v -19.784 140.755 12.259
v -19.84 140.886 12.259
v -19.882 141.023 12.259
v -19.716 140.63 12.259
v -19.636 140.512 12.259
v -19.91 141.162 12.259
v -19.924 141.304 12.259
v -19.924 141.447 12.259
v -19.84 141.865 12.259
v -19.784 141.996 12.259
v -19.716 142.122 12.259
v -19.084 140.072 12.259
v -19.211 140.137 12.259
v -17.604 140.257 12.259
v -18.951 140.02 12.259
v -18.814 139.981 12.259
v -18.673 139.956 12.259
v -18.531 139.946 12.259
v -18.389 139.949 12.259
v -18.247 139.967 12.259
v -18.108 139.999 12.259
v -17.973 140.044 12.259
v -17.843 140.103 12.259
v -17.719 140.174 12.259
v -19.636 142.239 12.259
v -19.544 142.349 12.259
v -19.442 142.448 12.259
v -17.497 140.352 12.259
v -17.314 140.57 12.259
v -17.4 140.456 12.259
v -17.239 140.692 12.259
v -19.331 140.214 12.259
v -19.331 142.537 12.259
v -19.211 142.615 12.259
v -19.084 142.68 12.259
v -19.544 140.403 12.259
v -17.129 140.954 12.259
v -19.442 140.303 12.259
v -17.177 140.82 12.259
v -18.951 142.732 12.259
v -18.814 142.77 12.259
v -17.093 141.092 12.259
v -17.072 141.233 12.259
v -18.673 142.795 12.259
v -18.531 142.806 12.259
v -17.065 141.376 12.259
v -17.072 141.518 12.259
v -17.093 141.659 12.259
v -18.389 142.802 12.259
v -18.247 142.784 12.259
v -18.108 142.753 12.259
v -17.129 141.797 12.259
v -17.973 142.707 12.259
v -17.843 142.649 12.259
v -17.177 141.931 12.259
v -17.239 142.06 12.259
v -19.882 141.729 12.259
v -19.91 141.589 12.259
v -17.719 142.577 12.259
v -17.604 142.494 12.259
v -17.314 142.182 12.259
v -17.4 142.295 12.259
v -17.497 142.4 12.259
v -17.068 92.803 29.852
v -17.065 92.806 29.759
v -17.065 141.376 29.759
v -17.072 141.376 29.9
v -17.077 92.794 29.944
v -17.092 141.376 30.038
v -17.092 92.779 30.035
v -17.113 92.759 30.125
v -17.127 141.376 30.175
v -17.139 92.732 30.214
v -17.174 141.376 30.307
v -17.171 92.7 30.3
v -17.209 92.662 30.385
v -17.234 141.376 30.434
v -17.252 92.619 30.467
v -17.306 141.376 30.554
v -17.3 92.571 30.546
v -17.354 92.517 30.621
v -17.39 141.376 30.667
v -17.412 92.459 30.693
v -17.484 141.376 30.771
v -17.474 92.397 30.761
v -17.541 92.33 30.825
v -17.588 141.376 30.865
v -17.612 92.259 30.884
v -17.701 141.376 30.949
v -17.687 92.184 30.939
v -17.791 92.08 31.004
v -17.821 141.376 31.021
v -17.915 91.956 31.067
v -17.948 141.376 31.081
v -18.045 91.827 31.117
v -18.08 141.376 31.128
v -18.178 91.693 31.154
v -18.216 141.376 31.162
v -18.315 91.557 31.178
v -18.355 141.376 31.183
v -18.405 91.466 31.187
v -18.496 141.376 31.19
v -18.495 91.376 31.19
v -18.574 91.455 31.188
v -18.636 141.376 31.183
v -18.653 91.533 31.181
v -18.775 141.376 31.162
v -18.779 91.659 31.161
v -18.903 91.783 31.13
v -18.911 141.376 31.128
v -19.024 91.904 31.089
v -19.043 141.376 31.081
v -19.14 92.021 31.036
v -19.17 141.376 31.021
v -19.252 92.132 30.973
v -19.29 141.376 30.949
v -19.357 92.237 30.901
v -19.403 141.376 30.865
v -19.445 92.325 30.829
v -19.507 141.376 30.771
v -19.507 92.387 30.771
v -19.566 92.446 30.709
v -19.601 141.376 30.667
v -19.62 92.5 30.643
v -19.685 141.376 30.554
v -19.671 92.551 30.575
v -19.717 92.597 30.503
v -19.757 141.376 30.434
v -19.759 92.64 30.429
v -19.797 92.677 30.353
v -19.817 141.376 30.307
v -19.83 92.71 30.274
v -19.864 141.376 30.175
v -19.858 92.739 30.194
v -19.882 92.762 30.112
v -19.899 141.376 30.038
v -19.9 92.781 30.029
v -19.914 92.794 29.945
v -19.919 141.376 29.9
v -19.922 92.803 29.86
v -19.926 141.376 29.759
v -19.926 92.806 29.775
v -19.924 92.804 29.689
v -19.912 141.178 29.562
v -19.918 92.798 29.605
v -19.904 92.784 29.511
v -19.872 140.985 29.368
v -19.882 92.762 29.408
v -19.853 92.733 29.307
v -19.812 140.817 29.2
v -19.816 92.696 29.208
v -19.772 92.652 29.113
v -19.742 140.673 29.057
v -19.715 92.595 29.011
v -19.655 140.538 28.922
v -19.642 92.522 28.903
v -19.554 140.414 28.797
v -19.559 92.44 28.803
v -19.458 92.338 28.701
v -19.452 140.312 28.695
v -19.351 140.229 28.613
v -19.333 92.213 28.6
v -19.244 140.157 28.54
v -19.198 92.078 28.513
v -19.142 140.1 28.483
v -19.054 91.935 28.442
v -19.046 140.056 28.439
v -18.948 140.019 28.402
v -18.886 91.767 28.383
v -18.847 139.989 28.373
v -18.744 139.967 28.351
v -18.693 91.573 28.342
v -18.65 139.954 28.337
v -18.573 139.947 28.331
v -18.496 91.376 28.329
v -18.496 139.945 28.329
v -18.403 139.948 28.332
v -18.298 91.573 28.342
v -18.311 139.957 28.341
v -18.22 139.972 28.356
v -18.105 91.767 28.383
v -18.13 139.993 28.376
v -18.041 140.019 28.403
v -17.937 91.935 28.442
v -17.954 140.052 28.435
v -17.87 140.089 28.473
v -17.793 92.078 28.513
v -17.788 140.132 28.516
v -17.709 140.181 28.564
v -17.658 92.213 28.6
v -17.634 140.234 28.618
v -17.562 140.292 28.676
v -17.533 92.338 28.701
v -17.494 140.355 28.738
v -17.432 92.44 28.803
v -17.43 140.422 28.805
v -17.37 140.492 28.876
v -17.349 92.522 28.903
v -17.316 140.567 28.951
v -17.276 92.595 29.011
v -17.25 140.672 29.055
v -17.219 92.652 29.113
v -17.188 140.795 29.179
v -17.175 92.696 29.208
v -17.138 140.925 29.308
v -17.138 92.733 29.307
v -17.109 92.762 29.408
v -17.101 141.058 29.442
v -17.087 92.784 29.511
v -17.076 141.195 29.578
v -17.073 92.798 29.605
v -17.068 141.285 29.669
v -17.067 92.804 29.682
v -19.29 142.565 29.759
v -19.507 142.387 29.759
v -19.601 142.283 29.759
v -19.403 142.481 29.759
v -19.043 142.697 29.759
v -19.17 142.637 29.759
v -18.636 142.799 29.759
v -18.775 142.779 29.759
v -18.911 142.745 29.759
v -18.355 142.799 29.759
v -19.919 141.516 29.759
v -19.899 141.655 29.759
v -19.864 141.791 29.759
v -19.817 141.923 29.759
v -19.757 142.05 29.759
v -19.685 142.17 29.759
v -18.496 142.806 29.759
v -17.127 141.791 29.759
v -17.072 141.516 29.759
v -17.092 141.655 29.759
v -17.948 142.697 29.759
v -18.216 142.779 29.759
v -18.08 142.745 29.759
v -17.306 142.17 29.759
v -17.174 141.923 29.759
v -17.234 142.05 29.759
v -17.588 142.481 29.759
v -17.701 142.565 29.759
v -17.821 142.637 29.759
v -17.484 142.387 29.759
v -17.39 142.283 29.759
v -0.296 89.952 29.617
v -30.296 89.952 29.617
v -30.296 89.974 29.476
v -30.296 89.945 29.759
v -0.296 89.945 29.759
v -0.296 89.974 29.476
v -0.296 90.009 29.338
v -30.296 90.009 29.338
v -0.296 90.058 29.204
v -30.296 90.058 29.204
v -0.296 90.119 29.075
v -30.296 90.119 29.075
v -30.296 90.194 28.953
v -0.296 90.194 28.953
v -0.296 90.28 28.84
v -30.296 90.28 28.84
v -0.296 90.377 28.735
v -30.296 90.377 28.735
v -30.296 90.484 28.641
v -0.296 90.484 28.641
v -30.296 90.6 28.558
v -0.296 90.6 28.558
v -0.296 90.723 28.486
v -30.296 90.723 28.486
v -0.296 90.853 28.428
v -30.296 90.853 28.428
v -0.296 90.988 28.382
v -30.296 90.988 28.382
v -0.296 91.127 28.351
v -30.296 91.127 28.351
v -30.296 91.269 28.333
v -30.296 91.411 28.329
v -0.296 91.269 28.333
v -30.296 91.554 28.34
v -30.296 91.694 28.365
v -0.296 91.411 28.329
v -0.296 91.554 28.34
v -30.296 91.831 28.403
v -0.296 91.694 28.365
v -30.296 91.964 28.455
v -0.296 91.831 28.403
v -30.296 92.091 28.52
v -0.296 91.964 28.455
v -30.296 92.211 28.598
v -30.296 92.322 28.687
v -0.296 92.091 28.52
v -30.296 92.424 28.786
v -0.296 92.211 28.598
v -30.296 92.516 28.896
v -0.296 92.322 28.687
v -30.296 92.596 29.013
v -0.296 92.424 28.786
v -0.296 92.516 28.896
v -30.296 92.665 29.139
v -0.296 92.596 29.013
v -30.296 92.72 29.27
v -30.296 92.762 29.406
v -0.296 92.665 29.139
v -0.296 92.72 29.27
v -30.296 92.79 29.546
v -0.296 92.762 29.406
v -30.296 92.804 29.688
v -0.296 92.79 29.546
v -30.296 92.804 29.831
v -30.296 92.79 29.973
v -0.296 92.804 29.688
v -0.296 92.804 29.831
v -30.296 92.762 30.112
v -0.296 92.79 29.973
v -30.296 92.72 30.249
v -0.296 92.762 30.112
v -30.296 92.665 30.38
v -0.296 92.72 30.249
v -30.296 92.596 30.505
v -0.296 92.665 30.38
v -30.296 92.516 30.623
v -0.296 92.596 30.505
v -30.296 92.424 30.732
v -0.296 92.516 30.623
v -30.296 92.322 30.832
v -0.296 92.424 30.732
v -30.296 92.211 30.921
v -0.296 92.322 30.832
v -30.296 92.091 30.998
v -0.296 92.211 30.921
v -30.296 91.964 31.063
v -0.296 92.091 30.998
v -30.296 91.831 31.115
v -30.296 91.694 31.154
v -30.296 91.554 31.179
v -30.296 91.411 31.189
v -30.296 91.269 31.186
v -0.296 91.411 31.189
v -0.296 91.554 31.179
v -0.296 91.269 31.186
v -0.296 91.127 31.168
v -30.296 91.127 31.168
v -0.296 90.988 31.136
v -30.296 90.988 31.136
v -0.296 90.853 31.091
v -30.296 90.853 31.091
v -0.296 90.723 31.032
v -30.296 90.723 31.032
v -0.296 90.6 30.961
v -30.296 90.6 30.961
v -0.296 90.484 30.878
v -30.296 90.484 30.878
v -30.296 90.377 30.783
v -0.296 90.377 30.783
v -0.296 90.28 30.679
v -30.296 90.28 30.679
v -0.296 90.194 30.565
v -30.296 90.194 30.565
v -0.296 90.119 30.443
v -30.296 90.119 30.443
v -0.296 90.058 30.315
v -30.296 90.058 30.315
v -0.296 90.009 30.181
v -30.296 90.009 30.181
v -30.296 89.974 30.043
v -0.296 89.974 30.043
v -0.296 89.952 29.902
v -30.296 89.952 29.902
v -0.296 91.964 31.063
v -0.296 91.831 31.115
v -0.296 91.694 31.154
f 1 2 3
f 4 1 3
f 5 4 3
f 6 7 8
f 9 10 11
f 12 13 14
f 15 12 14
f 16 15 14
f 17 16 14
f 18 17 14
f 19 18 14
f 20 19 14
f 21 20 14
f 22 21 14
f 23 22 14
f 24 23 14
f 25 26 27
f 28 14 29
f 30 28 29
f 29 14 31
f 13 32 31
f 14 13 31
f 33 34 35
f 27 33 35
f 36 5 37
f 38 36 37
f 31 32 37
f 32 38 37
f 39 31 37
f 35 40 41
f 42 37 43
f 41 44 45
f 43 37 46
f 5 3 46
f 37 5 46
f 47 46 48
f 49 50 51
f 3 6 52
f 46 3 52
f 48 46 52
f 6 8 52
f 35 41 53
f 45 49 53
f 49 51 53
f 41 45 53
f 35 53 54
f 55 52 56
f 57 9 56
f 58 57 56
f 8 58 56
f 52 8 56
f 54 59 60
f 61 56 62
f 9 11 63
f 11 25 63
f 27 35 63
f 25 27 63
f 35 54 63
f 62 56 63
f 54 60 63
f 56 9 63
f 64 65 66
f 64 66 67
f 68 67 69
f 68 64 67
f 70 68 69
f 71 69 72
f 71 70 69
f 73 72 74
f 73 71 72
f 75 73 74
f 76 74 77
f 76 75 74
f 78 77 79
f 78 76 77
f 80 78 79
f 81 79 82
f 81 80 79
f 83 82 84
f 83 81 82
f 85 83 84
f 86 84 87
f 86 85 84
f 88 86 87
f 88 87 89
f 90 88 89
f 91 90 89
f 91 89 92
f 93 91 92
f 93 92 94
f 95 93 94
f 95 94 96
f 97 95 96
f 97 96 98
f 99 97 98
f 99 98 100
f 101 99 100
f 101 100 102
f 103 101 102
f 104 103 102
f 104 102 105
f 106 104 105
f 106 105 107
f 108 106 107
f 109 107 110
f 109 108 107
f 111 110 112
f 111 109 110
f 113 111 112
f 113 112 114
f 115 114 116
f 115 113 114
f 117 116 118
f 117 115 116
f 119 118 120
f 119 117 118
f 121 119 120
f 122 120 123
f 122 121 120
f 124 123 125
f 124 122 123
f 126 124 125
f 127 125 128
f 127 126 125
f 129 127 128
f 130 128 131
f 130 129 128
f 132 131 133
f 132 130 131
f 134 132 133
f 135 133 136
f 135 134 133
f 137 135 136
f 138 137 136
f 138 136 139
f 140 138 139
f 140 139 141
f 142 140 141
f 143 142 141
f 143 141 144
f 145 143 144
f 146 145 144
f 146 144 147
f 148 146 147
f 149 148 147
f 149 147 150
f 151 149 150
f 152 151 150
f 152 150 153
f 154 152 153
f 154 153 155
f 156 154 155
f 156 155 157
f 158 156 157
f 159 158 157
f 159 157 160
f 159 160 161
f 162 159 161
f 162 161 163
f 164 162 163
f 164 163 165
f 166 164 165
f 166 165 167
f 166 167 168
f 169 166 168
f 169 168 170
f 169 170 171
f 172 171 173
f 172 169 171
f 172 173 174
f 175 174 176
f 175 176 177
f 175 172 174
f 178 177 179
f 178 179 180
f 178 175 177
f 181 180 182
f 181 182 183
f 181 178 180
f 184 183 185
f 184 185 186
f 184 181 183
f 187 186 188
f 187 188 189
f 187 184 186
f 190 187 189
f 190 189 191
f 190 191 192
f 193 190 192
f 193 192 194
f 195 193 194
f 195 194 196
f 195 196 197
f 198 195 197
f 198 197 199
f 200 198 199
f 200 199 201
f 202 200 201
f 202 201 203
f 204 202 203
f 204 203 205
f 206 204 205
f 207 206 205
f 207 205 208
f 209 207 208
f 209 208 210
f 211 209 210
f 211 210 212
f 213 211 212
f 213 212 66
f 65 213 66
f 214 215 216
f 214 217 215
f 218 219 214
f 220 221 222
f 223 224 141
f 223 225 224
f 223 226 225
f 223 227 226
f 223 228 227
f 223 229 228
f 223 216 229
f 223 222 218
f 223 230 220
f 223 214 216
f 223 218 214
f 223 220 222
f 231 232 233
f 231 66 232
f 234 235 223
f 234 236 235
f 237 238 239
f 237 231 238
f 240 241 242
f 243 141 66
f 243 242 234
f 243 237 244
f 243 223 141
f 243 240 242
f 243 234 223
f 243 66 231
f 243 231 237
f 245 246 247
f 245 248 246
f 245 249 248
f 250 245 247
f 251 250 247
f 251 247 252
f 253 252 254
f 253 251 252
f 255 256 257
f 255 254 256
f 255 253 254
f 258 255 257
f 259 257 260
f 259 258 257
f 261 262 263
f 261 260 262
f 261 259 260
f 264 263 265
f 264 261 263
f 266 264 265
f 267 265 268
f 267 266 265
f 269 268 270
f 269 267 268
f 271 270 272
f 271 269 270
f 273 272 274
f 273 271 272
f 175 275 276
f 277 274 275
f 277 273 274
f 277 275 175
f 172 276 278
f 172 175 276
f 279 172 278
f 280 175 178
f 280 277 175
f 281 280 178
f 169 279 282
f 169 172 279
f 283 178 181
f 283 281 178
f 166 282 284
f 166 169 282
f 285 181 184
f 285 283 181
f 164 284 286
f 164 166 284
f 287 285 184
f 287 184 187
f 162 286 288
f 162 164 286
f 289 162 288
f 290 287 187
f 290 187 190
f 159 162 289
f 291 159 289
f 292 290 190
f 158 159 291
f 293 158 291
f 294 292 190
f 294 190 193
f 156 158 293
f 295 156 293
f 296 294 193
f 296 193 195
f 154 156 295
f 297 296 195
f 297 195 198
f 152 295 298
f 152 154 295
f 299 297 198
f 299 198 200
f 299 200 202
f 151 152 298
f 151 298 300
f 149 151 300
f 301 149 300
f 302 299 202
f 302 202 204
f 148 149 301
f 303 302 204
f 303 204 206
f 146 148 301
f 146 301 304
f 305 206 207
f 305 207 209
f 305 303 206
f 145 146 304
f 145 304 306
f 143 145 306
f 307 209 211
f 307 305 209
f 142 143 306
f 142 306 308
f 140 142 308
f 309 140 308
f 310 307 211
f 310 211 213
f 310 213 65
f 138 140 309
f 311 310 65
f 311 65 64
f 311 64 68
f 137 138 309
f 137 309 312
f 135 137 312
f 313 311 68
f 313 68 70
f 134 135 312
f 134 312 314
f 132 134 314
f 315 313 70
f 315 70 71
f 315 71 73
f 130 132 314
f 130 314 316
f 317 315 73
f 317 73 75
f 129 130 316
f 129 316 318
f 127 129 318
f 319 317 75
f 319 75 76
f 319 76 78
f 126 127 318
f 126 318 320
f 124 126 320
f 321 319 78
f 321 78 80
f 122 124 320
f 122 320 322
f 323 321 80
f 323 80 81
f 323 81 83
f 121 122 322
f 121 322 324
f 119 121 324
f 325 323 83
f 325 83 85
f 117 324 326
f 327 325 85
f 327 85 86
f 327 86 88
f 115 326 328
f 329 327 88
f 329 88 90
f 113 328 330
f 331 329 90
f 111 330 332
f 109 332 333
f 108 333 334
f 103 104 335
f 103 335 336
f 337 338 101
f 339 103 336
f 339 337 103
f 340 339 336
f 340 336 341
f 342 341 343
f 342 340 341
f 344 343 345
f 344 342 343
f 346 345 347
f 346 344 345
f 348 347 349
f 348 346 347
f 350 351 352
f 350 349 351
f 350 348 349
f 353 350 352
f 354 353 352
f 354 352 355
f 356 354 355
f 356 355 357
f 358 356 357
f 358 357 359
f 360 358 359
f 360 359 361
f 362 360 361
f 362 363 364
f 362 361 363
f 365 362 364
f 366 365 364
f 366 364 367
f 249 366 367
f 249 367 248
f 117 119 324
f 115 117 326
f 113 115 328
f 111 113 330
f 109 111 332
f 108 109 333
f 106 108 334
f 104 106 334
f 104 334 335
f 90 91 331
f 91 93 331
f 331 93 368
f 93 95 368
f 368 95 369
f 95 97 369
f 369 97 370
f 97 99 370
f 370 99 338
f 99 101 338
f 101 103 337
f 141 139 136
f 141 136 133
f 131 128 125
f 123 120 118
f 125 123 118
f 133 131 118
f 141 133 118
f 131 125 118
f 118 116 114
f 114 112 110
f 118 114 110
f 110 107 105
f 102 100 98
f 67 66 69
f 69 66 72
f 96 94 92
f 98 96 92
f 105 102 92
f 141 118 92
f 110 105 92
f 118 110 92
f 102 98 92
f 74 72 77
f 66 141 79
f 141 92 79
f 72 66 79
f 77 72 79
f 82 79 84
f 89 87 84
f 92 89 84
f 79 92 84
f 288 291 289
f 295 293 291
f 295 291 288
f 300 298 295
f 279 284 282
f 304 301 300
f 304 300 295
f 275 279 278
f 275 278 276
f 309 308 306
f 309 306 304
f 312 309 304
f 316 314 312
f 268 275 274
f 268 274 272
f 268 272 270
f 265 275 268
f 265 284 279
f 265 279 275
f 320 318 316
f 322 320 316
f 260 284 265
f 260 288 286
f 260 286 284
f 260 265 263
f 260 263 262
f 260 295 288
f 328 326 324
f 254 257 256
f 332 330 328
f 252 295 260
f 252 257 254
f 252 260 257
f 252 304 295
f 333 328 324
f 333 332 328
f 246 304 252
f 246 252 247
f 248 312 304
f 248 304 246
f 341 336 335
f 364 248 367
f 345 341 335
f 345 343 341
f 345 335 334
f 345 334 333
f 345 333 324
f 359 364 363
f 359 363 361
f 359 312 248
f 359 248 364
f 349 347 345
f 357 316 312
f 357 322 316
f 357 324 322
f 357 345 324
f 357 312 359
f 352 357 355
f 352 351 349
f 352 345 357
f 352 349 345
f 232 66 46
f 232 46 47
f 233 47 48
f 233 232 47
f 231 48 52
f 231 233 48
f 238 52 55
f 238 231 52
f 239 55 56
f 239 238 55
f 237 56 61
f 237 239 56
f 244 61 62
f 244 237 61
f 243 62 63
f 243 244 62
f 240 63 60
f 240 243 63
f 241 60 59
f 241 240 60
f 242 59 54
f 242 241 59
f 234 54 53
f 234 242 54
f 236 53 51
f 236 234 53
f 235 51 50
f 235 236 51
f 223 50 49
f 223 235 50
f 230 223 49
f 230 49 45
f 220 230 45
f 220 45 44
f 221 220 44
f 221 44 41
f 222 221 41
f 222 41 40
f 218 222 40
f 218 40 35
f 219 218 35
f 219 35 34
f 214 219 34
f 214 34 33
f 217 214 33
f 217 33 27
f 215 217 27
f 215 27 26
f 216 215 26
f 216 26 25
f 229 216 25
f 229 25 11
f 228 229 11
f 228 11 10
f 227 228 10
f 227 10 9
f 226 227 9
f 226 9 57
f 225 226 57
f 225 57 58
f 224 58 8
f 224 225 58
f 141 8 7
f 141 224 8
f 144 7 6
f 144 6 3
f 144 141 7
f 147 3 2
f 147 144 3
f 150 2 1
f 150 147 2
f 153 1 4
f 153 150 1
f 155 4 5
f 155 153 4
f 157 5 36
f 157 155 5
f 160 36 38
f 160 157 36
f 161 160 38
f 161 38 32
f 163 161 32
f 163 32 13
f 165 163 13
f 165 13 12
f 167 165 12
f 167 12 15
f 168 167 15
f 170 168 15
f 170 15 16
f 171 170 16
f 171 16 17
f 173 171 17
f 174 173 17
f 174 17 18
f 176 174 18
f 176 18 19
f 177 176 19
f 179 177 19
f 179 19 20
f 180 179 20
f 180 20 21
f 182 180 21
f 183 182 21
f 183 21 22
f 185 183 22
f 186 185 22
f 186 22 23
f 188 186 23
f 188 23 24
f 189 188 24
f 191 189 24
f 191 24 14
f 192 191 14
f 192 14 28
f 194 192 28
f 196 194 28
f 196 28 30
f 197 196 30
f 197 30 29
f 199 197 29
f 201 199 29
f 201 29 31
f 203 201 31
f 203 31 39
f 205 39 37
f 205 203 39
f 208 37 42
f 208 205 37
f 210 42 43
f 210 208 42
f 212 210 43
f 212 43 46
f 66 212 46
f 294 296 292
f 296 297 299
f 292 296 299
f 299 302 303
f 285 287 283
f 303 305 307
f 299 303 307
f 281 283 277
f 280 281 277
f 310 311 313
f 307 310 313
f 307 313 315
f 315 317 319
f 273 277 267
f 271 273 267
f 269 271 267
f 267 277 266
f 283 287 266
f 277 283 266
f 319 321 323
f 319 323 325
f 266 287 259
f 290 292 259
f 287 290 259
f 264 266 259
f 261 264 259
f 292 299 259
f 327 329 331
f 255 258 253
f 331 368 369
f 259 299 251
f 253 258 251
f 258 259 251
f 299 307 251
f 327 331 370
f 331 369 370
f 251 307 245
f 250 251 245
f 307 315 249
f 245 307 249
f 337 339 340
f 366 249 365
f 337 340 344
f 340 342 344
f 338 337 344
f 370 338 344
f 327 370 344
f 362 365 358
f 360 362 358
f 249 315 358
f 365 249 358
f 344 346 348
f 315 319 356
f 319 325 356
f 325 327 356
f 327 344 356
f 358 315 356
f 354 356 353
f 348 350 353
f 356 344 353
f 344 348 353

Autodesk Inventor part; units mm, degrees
ref_plane "YZ Plane" through (0, 0, 0) normal (1, 0, 0) x (0, 1, 0)
ref_plane "XZ Plane" through (0, 0, 0) normal (0, 1, 0) x (-1, 0, 0)
ref_plane "Work Plane1" through (-0.2955, 151.1757, 22.2593) normal (-1, 0, 0) x (0, -1, 0)
sketch "Sketch1" plane through (-0.2955, 151.1757, 22.2593) normal (-1, 0, 0) x (0, -1, 0)
  arc A0 (59.8, 2) -> (63.9581, 11.1) centre (59.8, 7.5) ccw projected
  circle A1 centre (59.8, 7.5) radius 1.4305
  point P0 (151.1757, -22.2593)
extrude "Extrusion1" add sketch "Sketch1" along normal blind 30
ref_plane "Work Plane2" through (-18.4955, 91.3757, 29.7593) normal (-1, 0, 0) x (0, -1, 0)
ref_plane "Work Plane4" through (-30.2955, 91.3757, 29.7593) normal (0, -1, 0) x (1, 0, 0)
ref_plane "Work Plane3" through (-0.2955, 73.8757, 22.2593) normal (0, -1, 0) x (1, 0, 0)
sketch "Sketch2" plane through (-30.2955, 91.3757, 29.7593) normal (0, -1, 0) x (1, 0, 0)
  line L0 (0, 1.4305) -> (0, -1.4305) projected
  line L1 (30, -1.4305) -> (30, 1.4305) projected
  circle A0 centre (11.8, 0) radius 1.4305
  line L2 (30, -1.4305) -> (0, -1.4305) projected
  line L3 (26.8, 6.34) -> (26.8, -6.34) projected
  point P0 (30.2955, -29.7593)
  dimension "d2" = 15
extrude "Extrusion2" add sketch "Sketch2" against normal blind 50
ref_plane "Work Plane6" through (-18.4955, 141.3757, 29.7593) normal (0, 0, 1) x (1, 0, 0)
ref_plane "Work Plane5" through (74.7045, 112.5257, 35.3593) normal (0, 0, 1) x (1, 0, 0)
sketch "Sketch3" plane through (-18.4955, 141.3757, 29.7593) normal (0, 0, 1) x (1, 0, 0)
  line L0 (1.4305, 0) -> (-1.4305, 0) projected
  circle A0 centre (0, 0) radius 1.4305
  line L1 (1.4305, -48.5695) -> (1.4305, 0) projected
  point P0 (18.4955, -141.3757)
ref_plane "Work Plane7" through (-19.4482, 115.8757, 12.2593) normal (0, 0, 1) x (1, 0, 0)
extrude "Extrusion3" add sketch "Sketch3" against normal up to surface (17.5 mm away)
ref_plane "Work Plane10" through (-18.4955, 141.3757, 29.7593) normal (0, -0.7071, 0.7071) x (-1, 0, 0)
ref_plane "Work Plane9" through (-18.4955, 141.3757, 12.2593) normal (0, -1, 0) x (1, 0, 0)
ref_plane "Work Plane8" through (-57.7234, 76.1875, 20.0898) normal (0, -1, 0) x (1, 0, 0)
properties part number "00_Lightpath"
